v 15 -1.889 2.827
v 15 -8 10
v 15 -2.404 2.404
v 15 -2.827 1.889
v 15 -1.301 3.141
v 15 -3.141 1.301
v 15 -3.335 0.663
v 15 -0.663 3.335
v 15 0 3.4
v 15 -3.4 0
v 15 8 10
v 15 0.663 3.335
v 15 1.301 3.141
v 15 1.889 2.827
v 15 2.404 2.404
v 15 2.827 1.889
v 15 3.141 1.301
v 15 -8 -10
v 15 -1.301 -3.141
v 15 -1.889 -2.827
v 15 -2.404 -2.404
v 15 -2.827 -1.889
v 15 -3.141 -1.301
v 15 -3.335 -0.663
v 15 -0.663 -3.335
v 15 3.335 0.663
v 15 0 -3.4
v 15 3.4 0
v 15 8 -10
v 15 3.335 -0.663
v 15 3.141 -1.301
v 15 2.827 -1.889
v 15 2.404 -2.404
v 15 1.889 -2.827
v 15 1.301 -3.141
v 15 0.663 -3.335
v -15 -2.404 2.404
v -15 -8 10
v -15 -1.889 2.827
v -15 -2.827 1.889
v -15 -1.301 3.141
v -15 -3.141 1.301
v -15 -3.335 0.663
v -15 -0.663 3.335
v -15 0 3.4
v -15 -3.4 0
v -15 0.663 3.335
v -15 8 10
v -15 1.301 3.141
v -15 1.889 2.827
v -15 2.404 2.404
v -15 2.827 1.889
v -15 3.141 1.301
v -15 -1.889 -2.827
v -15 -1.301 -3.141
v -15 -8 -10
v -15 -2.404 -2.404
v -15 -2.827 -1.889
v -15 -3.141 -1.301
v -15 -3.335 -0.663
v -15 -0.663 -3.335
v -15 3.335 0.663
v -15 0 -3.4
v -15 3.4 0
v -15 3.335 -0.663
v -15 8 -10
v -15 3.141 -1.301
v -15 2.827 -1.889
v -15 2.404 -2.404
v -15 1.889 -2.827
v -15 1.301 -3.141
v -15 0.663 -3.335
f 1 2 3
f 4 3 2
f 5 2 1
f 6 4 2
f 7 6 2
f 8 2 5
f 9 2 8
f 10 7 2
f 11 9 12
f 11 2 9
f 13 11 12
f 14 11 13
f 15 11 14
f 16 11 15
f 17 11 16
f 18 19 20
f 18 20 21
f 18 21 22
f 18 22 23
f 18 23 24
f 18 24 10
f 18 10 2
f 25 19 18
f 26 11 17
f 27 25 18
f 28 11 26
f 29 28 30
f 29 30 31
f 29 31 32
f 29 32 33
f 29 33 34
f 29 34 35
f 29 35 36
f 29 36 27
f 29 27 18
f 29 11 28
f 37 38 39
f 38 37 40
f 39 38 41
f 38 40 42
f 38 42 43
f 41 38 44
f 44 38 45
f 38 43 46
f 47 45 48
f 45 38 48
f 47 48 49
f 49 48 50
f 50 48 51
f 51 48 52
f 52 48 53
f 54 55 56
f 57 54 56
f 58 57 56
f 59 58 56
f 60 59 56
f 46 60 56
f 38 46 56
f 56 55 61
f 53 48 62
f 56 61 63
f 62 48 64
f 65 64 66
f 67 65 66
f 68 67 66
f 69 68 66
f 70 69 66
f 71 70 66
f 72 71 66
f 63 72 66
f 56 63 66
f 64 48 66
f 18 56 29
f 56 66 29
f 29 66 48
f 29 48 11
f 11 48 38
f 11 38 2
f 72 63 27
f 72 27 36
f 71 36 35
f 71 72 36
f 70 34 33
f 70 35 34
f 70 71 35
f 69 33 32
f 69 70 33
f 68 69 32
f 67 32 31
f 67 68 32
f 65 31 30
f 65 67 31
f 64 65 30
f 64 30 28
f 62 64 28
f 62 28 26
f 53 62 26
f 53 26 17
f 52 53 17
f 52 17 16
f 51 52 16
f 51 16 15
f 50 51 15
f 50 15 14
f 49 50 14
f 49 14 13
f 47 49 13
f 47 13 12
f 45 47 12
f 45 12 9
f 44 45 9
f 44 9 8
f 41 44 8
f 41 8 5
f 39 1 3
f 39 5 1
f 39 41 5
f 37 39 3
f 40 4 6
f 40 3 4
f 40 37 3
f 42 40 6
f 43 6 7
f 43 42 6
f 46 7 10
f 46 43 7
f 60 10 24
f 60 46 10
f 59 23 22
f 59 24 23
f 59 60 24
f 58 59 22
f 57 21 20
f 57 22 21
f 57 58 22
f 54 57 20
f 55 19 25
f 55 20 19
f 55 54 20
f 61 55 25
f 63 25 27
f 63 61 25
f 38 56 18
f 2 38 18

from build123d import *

# Parameters (mm, degrees)
SKETCH2_W               = 30
SKETCH2_H               = 20
BOSS_EXTRUDE1_DEPTH     = 8
CUT_EXTRUDE1_DEPTH      = 20.723082923
CUT_EXTRUDE1_DEPTH_BACK = 20.723082923
SKETCH5_R               = 3.4


with BuildPart() as part:
    # Sketch2 → Boss-Extrude1 (new, symmetric)
    with BuildSketch(Plane(origin=(0, 0, 0), x_dir=(1, 0, 0), z_dir=(0, 1, 0))):
        Rectangle(SKETCH2_W, SKETCH2_H)
    extrude(amount=BOSS_EXTRUDE1_DEPTH, both=True)

    # Sketch5 → Cut-Extrude1 (cut, two sides: drawn at the far end of the back side and taken through both)
    with BuildSketch(Plane(origin=(0, 0, 0), x_dir=(0, 0, -1), z_dir=(1, 0, 0)).offset(-CUT_EXTRUDE1_DEPTH_BACK)):
        Circle(SKETCH5_R)
    extrude(amount=CUT_EXTRUDE1_DEPTH + CUT_EXTRUDE1_DEPTH_BACK, mode=Mode.SUBTRACT)


solid = part.part
